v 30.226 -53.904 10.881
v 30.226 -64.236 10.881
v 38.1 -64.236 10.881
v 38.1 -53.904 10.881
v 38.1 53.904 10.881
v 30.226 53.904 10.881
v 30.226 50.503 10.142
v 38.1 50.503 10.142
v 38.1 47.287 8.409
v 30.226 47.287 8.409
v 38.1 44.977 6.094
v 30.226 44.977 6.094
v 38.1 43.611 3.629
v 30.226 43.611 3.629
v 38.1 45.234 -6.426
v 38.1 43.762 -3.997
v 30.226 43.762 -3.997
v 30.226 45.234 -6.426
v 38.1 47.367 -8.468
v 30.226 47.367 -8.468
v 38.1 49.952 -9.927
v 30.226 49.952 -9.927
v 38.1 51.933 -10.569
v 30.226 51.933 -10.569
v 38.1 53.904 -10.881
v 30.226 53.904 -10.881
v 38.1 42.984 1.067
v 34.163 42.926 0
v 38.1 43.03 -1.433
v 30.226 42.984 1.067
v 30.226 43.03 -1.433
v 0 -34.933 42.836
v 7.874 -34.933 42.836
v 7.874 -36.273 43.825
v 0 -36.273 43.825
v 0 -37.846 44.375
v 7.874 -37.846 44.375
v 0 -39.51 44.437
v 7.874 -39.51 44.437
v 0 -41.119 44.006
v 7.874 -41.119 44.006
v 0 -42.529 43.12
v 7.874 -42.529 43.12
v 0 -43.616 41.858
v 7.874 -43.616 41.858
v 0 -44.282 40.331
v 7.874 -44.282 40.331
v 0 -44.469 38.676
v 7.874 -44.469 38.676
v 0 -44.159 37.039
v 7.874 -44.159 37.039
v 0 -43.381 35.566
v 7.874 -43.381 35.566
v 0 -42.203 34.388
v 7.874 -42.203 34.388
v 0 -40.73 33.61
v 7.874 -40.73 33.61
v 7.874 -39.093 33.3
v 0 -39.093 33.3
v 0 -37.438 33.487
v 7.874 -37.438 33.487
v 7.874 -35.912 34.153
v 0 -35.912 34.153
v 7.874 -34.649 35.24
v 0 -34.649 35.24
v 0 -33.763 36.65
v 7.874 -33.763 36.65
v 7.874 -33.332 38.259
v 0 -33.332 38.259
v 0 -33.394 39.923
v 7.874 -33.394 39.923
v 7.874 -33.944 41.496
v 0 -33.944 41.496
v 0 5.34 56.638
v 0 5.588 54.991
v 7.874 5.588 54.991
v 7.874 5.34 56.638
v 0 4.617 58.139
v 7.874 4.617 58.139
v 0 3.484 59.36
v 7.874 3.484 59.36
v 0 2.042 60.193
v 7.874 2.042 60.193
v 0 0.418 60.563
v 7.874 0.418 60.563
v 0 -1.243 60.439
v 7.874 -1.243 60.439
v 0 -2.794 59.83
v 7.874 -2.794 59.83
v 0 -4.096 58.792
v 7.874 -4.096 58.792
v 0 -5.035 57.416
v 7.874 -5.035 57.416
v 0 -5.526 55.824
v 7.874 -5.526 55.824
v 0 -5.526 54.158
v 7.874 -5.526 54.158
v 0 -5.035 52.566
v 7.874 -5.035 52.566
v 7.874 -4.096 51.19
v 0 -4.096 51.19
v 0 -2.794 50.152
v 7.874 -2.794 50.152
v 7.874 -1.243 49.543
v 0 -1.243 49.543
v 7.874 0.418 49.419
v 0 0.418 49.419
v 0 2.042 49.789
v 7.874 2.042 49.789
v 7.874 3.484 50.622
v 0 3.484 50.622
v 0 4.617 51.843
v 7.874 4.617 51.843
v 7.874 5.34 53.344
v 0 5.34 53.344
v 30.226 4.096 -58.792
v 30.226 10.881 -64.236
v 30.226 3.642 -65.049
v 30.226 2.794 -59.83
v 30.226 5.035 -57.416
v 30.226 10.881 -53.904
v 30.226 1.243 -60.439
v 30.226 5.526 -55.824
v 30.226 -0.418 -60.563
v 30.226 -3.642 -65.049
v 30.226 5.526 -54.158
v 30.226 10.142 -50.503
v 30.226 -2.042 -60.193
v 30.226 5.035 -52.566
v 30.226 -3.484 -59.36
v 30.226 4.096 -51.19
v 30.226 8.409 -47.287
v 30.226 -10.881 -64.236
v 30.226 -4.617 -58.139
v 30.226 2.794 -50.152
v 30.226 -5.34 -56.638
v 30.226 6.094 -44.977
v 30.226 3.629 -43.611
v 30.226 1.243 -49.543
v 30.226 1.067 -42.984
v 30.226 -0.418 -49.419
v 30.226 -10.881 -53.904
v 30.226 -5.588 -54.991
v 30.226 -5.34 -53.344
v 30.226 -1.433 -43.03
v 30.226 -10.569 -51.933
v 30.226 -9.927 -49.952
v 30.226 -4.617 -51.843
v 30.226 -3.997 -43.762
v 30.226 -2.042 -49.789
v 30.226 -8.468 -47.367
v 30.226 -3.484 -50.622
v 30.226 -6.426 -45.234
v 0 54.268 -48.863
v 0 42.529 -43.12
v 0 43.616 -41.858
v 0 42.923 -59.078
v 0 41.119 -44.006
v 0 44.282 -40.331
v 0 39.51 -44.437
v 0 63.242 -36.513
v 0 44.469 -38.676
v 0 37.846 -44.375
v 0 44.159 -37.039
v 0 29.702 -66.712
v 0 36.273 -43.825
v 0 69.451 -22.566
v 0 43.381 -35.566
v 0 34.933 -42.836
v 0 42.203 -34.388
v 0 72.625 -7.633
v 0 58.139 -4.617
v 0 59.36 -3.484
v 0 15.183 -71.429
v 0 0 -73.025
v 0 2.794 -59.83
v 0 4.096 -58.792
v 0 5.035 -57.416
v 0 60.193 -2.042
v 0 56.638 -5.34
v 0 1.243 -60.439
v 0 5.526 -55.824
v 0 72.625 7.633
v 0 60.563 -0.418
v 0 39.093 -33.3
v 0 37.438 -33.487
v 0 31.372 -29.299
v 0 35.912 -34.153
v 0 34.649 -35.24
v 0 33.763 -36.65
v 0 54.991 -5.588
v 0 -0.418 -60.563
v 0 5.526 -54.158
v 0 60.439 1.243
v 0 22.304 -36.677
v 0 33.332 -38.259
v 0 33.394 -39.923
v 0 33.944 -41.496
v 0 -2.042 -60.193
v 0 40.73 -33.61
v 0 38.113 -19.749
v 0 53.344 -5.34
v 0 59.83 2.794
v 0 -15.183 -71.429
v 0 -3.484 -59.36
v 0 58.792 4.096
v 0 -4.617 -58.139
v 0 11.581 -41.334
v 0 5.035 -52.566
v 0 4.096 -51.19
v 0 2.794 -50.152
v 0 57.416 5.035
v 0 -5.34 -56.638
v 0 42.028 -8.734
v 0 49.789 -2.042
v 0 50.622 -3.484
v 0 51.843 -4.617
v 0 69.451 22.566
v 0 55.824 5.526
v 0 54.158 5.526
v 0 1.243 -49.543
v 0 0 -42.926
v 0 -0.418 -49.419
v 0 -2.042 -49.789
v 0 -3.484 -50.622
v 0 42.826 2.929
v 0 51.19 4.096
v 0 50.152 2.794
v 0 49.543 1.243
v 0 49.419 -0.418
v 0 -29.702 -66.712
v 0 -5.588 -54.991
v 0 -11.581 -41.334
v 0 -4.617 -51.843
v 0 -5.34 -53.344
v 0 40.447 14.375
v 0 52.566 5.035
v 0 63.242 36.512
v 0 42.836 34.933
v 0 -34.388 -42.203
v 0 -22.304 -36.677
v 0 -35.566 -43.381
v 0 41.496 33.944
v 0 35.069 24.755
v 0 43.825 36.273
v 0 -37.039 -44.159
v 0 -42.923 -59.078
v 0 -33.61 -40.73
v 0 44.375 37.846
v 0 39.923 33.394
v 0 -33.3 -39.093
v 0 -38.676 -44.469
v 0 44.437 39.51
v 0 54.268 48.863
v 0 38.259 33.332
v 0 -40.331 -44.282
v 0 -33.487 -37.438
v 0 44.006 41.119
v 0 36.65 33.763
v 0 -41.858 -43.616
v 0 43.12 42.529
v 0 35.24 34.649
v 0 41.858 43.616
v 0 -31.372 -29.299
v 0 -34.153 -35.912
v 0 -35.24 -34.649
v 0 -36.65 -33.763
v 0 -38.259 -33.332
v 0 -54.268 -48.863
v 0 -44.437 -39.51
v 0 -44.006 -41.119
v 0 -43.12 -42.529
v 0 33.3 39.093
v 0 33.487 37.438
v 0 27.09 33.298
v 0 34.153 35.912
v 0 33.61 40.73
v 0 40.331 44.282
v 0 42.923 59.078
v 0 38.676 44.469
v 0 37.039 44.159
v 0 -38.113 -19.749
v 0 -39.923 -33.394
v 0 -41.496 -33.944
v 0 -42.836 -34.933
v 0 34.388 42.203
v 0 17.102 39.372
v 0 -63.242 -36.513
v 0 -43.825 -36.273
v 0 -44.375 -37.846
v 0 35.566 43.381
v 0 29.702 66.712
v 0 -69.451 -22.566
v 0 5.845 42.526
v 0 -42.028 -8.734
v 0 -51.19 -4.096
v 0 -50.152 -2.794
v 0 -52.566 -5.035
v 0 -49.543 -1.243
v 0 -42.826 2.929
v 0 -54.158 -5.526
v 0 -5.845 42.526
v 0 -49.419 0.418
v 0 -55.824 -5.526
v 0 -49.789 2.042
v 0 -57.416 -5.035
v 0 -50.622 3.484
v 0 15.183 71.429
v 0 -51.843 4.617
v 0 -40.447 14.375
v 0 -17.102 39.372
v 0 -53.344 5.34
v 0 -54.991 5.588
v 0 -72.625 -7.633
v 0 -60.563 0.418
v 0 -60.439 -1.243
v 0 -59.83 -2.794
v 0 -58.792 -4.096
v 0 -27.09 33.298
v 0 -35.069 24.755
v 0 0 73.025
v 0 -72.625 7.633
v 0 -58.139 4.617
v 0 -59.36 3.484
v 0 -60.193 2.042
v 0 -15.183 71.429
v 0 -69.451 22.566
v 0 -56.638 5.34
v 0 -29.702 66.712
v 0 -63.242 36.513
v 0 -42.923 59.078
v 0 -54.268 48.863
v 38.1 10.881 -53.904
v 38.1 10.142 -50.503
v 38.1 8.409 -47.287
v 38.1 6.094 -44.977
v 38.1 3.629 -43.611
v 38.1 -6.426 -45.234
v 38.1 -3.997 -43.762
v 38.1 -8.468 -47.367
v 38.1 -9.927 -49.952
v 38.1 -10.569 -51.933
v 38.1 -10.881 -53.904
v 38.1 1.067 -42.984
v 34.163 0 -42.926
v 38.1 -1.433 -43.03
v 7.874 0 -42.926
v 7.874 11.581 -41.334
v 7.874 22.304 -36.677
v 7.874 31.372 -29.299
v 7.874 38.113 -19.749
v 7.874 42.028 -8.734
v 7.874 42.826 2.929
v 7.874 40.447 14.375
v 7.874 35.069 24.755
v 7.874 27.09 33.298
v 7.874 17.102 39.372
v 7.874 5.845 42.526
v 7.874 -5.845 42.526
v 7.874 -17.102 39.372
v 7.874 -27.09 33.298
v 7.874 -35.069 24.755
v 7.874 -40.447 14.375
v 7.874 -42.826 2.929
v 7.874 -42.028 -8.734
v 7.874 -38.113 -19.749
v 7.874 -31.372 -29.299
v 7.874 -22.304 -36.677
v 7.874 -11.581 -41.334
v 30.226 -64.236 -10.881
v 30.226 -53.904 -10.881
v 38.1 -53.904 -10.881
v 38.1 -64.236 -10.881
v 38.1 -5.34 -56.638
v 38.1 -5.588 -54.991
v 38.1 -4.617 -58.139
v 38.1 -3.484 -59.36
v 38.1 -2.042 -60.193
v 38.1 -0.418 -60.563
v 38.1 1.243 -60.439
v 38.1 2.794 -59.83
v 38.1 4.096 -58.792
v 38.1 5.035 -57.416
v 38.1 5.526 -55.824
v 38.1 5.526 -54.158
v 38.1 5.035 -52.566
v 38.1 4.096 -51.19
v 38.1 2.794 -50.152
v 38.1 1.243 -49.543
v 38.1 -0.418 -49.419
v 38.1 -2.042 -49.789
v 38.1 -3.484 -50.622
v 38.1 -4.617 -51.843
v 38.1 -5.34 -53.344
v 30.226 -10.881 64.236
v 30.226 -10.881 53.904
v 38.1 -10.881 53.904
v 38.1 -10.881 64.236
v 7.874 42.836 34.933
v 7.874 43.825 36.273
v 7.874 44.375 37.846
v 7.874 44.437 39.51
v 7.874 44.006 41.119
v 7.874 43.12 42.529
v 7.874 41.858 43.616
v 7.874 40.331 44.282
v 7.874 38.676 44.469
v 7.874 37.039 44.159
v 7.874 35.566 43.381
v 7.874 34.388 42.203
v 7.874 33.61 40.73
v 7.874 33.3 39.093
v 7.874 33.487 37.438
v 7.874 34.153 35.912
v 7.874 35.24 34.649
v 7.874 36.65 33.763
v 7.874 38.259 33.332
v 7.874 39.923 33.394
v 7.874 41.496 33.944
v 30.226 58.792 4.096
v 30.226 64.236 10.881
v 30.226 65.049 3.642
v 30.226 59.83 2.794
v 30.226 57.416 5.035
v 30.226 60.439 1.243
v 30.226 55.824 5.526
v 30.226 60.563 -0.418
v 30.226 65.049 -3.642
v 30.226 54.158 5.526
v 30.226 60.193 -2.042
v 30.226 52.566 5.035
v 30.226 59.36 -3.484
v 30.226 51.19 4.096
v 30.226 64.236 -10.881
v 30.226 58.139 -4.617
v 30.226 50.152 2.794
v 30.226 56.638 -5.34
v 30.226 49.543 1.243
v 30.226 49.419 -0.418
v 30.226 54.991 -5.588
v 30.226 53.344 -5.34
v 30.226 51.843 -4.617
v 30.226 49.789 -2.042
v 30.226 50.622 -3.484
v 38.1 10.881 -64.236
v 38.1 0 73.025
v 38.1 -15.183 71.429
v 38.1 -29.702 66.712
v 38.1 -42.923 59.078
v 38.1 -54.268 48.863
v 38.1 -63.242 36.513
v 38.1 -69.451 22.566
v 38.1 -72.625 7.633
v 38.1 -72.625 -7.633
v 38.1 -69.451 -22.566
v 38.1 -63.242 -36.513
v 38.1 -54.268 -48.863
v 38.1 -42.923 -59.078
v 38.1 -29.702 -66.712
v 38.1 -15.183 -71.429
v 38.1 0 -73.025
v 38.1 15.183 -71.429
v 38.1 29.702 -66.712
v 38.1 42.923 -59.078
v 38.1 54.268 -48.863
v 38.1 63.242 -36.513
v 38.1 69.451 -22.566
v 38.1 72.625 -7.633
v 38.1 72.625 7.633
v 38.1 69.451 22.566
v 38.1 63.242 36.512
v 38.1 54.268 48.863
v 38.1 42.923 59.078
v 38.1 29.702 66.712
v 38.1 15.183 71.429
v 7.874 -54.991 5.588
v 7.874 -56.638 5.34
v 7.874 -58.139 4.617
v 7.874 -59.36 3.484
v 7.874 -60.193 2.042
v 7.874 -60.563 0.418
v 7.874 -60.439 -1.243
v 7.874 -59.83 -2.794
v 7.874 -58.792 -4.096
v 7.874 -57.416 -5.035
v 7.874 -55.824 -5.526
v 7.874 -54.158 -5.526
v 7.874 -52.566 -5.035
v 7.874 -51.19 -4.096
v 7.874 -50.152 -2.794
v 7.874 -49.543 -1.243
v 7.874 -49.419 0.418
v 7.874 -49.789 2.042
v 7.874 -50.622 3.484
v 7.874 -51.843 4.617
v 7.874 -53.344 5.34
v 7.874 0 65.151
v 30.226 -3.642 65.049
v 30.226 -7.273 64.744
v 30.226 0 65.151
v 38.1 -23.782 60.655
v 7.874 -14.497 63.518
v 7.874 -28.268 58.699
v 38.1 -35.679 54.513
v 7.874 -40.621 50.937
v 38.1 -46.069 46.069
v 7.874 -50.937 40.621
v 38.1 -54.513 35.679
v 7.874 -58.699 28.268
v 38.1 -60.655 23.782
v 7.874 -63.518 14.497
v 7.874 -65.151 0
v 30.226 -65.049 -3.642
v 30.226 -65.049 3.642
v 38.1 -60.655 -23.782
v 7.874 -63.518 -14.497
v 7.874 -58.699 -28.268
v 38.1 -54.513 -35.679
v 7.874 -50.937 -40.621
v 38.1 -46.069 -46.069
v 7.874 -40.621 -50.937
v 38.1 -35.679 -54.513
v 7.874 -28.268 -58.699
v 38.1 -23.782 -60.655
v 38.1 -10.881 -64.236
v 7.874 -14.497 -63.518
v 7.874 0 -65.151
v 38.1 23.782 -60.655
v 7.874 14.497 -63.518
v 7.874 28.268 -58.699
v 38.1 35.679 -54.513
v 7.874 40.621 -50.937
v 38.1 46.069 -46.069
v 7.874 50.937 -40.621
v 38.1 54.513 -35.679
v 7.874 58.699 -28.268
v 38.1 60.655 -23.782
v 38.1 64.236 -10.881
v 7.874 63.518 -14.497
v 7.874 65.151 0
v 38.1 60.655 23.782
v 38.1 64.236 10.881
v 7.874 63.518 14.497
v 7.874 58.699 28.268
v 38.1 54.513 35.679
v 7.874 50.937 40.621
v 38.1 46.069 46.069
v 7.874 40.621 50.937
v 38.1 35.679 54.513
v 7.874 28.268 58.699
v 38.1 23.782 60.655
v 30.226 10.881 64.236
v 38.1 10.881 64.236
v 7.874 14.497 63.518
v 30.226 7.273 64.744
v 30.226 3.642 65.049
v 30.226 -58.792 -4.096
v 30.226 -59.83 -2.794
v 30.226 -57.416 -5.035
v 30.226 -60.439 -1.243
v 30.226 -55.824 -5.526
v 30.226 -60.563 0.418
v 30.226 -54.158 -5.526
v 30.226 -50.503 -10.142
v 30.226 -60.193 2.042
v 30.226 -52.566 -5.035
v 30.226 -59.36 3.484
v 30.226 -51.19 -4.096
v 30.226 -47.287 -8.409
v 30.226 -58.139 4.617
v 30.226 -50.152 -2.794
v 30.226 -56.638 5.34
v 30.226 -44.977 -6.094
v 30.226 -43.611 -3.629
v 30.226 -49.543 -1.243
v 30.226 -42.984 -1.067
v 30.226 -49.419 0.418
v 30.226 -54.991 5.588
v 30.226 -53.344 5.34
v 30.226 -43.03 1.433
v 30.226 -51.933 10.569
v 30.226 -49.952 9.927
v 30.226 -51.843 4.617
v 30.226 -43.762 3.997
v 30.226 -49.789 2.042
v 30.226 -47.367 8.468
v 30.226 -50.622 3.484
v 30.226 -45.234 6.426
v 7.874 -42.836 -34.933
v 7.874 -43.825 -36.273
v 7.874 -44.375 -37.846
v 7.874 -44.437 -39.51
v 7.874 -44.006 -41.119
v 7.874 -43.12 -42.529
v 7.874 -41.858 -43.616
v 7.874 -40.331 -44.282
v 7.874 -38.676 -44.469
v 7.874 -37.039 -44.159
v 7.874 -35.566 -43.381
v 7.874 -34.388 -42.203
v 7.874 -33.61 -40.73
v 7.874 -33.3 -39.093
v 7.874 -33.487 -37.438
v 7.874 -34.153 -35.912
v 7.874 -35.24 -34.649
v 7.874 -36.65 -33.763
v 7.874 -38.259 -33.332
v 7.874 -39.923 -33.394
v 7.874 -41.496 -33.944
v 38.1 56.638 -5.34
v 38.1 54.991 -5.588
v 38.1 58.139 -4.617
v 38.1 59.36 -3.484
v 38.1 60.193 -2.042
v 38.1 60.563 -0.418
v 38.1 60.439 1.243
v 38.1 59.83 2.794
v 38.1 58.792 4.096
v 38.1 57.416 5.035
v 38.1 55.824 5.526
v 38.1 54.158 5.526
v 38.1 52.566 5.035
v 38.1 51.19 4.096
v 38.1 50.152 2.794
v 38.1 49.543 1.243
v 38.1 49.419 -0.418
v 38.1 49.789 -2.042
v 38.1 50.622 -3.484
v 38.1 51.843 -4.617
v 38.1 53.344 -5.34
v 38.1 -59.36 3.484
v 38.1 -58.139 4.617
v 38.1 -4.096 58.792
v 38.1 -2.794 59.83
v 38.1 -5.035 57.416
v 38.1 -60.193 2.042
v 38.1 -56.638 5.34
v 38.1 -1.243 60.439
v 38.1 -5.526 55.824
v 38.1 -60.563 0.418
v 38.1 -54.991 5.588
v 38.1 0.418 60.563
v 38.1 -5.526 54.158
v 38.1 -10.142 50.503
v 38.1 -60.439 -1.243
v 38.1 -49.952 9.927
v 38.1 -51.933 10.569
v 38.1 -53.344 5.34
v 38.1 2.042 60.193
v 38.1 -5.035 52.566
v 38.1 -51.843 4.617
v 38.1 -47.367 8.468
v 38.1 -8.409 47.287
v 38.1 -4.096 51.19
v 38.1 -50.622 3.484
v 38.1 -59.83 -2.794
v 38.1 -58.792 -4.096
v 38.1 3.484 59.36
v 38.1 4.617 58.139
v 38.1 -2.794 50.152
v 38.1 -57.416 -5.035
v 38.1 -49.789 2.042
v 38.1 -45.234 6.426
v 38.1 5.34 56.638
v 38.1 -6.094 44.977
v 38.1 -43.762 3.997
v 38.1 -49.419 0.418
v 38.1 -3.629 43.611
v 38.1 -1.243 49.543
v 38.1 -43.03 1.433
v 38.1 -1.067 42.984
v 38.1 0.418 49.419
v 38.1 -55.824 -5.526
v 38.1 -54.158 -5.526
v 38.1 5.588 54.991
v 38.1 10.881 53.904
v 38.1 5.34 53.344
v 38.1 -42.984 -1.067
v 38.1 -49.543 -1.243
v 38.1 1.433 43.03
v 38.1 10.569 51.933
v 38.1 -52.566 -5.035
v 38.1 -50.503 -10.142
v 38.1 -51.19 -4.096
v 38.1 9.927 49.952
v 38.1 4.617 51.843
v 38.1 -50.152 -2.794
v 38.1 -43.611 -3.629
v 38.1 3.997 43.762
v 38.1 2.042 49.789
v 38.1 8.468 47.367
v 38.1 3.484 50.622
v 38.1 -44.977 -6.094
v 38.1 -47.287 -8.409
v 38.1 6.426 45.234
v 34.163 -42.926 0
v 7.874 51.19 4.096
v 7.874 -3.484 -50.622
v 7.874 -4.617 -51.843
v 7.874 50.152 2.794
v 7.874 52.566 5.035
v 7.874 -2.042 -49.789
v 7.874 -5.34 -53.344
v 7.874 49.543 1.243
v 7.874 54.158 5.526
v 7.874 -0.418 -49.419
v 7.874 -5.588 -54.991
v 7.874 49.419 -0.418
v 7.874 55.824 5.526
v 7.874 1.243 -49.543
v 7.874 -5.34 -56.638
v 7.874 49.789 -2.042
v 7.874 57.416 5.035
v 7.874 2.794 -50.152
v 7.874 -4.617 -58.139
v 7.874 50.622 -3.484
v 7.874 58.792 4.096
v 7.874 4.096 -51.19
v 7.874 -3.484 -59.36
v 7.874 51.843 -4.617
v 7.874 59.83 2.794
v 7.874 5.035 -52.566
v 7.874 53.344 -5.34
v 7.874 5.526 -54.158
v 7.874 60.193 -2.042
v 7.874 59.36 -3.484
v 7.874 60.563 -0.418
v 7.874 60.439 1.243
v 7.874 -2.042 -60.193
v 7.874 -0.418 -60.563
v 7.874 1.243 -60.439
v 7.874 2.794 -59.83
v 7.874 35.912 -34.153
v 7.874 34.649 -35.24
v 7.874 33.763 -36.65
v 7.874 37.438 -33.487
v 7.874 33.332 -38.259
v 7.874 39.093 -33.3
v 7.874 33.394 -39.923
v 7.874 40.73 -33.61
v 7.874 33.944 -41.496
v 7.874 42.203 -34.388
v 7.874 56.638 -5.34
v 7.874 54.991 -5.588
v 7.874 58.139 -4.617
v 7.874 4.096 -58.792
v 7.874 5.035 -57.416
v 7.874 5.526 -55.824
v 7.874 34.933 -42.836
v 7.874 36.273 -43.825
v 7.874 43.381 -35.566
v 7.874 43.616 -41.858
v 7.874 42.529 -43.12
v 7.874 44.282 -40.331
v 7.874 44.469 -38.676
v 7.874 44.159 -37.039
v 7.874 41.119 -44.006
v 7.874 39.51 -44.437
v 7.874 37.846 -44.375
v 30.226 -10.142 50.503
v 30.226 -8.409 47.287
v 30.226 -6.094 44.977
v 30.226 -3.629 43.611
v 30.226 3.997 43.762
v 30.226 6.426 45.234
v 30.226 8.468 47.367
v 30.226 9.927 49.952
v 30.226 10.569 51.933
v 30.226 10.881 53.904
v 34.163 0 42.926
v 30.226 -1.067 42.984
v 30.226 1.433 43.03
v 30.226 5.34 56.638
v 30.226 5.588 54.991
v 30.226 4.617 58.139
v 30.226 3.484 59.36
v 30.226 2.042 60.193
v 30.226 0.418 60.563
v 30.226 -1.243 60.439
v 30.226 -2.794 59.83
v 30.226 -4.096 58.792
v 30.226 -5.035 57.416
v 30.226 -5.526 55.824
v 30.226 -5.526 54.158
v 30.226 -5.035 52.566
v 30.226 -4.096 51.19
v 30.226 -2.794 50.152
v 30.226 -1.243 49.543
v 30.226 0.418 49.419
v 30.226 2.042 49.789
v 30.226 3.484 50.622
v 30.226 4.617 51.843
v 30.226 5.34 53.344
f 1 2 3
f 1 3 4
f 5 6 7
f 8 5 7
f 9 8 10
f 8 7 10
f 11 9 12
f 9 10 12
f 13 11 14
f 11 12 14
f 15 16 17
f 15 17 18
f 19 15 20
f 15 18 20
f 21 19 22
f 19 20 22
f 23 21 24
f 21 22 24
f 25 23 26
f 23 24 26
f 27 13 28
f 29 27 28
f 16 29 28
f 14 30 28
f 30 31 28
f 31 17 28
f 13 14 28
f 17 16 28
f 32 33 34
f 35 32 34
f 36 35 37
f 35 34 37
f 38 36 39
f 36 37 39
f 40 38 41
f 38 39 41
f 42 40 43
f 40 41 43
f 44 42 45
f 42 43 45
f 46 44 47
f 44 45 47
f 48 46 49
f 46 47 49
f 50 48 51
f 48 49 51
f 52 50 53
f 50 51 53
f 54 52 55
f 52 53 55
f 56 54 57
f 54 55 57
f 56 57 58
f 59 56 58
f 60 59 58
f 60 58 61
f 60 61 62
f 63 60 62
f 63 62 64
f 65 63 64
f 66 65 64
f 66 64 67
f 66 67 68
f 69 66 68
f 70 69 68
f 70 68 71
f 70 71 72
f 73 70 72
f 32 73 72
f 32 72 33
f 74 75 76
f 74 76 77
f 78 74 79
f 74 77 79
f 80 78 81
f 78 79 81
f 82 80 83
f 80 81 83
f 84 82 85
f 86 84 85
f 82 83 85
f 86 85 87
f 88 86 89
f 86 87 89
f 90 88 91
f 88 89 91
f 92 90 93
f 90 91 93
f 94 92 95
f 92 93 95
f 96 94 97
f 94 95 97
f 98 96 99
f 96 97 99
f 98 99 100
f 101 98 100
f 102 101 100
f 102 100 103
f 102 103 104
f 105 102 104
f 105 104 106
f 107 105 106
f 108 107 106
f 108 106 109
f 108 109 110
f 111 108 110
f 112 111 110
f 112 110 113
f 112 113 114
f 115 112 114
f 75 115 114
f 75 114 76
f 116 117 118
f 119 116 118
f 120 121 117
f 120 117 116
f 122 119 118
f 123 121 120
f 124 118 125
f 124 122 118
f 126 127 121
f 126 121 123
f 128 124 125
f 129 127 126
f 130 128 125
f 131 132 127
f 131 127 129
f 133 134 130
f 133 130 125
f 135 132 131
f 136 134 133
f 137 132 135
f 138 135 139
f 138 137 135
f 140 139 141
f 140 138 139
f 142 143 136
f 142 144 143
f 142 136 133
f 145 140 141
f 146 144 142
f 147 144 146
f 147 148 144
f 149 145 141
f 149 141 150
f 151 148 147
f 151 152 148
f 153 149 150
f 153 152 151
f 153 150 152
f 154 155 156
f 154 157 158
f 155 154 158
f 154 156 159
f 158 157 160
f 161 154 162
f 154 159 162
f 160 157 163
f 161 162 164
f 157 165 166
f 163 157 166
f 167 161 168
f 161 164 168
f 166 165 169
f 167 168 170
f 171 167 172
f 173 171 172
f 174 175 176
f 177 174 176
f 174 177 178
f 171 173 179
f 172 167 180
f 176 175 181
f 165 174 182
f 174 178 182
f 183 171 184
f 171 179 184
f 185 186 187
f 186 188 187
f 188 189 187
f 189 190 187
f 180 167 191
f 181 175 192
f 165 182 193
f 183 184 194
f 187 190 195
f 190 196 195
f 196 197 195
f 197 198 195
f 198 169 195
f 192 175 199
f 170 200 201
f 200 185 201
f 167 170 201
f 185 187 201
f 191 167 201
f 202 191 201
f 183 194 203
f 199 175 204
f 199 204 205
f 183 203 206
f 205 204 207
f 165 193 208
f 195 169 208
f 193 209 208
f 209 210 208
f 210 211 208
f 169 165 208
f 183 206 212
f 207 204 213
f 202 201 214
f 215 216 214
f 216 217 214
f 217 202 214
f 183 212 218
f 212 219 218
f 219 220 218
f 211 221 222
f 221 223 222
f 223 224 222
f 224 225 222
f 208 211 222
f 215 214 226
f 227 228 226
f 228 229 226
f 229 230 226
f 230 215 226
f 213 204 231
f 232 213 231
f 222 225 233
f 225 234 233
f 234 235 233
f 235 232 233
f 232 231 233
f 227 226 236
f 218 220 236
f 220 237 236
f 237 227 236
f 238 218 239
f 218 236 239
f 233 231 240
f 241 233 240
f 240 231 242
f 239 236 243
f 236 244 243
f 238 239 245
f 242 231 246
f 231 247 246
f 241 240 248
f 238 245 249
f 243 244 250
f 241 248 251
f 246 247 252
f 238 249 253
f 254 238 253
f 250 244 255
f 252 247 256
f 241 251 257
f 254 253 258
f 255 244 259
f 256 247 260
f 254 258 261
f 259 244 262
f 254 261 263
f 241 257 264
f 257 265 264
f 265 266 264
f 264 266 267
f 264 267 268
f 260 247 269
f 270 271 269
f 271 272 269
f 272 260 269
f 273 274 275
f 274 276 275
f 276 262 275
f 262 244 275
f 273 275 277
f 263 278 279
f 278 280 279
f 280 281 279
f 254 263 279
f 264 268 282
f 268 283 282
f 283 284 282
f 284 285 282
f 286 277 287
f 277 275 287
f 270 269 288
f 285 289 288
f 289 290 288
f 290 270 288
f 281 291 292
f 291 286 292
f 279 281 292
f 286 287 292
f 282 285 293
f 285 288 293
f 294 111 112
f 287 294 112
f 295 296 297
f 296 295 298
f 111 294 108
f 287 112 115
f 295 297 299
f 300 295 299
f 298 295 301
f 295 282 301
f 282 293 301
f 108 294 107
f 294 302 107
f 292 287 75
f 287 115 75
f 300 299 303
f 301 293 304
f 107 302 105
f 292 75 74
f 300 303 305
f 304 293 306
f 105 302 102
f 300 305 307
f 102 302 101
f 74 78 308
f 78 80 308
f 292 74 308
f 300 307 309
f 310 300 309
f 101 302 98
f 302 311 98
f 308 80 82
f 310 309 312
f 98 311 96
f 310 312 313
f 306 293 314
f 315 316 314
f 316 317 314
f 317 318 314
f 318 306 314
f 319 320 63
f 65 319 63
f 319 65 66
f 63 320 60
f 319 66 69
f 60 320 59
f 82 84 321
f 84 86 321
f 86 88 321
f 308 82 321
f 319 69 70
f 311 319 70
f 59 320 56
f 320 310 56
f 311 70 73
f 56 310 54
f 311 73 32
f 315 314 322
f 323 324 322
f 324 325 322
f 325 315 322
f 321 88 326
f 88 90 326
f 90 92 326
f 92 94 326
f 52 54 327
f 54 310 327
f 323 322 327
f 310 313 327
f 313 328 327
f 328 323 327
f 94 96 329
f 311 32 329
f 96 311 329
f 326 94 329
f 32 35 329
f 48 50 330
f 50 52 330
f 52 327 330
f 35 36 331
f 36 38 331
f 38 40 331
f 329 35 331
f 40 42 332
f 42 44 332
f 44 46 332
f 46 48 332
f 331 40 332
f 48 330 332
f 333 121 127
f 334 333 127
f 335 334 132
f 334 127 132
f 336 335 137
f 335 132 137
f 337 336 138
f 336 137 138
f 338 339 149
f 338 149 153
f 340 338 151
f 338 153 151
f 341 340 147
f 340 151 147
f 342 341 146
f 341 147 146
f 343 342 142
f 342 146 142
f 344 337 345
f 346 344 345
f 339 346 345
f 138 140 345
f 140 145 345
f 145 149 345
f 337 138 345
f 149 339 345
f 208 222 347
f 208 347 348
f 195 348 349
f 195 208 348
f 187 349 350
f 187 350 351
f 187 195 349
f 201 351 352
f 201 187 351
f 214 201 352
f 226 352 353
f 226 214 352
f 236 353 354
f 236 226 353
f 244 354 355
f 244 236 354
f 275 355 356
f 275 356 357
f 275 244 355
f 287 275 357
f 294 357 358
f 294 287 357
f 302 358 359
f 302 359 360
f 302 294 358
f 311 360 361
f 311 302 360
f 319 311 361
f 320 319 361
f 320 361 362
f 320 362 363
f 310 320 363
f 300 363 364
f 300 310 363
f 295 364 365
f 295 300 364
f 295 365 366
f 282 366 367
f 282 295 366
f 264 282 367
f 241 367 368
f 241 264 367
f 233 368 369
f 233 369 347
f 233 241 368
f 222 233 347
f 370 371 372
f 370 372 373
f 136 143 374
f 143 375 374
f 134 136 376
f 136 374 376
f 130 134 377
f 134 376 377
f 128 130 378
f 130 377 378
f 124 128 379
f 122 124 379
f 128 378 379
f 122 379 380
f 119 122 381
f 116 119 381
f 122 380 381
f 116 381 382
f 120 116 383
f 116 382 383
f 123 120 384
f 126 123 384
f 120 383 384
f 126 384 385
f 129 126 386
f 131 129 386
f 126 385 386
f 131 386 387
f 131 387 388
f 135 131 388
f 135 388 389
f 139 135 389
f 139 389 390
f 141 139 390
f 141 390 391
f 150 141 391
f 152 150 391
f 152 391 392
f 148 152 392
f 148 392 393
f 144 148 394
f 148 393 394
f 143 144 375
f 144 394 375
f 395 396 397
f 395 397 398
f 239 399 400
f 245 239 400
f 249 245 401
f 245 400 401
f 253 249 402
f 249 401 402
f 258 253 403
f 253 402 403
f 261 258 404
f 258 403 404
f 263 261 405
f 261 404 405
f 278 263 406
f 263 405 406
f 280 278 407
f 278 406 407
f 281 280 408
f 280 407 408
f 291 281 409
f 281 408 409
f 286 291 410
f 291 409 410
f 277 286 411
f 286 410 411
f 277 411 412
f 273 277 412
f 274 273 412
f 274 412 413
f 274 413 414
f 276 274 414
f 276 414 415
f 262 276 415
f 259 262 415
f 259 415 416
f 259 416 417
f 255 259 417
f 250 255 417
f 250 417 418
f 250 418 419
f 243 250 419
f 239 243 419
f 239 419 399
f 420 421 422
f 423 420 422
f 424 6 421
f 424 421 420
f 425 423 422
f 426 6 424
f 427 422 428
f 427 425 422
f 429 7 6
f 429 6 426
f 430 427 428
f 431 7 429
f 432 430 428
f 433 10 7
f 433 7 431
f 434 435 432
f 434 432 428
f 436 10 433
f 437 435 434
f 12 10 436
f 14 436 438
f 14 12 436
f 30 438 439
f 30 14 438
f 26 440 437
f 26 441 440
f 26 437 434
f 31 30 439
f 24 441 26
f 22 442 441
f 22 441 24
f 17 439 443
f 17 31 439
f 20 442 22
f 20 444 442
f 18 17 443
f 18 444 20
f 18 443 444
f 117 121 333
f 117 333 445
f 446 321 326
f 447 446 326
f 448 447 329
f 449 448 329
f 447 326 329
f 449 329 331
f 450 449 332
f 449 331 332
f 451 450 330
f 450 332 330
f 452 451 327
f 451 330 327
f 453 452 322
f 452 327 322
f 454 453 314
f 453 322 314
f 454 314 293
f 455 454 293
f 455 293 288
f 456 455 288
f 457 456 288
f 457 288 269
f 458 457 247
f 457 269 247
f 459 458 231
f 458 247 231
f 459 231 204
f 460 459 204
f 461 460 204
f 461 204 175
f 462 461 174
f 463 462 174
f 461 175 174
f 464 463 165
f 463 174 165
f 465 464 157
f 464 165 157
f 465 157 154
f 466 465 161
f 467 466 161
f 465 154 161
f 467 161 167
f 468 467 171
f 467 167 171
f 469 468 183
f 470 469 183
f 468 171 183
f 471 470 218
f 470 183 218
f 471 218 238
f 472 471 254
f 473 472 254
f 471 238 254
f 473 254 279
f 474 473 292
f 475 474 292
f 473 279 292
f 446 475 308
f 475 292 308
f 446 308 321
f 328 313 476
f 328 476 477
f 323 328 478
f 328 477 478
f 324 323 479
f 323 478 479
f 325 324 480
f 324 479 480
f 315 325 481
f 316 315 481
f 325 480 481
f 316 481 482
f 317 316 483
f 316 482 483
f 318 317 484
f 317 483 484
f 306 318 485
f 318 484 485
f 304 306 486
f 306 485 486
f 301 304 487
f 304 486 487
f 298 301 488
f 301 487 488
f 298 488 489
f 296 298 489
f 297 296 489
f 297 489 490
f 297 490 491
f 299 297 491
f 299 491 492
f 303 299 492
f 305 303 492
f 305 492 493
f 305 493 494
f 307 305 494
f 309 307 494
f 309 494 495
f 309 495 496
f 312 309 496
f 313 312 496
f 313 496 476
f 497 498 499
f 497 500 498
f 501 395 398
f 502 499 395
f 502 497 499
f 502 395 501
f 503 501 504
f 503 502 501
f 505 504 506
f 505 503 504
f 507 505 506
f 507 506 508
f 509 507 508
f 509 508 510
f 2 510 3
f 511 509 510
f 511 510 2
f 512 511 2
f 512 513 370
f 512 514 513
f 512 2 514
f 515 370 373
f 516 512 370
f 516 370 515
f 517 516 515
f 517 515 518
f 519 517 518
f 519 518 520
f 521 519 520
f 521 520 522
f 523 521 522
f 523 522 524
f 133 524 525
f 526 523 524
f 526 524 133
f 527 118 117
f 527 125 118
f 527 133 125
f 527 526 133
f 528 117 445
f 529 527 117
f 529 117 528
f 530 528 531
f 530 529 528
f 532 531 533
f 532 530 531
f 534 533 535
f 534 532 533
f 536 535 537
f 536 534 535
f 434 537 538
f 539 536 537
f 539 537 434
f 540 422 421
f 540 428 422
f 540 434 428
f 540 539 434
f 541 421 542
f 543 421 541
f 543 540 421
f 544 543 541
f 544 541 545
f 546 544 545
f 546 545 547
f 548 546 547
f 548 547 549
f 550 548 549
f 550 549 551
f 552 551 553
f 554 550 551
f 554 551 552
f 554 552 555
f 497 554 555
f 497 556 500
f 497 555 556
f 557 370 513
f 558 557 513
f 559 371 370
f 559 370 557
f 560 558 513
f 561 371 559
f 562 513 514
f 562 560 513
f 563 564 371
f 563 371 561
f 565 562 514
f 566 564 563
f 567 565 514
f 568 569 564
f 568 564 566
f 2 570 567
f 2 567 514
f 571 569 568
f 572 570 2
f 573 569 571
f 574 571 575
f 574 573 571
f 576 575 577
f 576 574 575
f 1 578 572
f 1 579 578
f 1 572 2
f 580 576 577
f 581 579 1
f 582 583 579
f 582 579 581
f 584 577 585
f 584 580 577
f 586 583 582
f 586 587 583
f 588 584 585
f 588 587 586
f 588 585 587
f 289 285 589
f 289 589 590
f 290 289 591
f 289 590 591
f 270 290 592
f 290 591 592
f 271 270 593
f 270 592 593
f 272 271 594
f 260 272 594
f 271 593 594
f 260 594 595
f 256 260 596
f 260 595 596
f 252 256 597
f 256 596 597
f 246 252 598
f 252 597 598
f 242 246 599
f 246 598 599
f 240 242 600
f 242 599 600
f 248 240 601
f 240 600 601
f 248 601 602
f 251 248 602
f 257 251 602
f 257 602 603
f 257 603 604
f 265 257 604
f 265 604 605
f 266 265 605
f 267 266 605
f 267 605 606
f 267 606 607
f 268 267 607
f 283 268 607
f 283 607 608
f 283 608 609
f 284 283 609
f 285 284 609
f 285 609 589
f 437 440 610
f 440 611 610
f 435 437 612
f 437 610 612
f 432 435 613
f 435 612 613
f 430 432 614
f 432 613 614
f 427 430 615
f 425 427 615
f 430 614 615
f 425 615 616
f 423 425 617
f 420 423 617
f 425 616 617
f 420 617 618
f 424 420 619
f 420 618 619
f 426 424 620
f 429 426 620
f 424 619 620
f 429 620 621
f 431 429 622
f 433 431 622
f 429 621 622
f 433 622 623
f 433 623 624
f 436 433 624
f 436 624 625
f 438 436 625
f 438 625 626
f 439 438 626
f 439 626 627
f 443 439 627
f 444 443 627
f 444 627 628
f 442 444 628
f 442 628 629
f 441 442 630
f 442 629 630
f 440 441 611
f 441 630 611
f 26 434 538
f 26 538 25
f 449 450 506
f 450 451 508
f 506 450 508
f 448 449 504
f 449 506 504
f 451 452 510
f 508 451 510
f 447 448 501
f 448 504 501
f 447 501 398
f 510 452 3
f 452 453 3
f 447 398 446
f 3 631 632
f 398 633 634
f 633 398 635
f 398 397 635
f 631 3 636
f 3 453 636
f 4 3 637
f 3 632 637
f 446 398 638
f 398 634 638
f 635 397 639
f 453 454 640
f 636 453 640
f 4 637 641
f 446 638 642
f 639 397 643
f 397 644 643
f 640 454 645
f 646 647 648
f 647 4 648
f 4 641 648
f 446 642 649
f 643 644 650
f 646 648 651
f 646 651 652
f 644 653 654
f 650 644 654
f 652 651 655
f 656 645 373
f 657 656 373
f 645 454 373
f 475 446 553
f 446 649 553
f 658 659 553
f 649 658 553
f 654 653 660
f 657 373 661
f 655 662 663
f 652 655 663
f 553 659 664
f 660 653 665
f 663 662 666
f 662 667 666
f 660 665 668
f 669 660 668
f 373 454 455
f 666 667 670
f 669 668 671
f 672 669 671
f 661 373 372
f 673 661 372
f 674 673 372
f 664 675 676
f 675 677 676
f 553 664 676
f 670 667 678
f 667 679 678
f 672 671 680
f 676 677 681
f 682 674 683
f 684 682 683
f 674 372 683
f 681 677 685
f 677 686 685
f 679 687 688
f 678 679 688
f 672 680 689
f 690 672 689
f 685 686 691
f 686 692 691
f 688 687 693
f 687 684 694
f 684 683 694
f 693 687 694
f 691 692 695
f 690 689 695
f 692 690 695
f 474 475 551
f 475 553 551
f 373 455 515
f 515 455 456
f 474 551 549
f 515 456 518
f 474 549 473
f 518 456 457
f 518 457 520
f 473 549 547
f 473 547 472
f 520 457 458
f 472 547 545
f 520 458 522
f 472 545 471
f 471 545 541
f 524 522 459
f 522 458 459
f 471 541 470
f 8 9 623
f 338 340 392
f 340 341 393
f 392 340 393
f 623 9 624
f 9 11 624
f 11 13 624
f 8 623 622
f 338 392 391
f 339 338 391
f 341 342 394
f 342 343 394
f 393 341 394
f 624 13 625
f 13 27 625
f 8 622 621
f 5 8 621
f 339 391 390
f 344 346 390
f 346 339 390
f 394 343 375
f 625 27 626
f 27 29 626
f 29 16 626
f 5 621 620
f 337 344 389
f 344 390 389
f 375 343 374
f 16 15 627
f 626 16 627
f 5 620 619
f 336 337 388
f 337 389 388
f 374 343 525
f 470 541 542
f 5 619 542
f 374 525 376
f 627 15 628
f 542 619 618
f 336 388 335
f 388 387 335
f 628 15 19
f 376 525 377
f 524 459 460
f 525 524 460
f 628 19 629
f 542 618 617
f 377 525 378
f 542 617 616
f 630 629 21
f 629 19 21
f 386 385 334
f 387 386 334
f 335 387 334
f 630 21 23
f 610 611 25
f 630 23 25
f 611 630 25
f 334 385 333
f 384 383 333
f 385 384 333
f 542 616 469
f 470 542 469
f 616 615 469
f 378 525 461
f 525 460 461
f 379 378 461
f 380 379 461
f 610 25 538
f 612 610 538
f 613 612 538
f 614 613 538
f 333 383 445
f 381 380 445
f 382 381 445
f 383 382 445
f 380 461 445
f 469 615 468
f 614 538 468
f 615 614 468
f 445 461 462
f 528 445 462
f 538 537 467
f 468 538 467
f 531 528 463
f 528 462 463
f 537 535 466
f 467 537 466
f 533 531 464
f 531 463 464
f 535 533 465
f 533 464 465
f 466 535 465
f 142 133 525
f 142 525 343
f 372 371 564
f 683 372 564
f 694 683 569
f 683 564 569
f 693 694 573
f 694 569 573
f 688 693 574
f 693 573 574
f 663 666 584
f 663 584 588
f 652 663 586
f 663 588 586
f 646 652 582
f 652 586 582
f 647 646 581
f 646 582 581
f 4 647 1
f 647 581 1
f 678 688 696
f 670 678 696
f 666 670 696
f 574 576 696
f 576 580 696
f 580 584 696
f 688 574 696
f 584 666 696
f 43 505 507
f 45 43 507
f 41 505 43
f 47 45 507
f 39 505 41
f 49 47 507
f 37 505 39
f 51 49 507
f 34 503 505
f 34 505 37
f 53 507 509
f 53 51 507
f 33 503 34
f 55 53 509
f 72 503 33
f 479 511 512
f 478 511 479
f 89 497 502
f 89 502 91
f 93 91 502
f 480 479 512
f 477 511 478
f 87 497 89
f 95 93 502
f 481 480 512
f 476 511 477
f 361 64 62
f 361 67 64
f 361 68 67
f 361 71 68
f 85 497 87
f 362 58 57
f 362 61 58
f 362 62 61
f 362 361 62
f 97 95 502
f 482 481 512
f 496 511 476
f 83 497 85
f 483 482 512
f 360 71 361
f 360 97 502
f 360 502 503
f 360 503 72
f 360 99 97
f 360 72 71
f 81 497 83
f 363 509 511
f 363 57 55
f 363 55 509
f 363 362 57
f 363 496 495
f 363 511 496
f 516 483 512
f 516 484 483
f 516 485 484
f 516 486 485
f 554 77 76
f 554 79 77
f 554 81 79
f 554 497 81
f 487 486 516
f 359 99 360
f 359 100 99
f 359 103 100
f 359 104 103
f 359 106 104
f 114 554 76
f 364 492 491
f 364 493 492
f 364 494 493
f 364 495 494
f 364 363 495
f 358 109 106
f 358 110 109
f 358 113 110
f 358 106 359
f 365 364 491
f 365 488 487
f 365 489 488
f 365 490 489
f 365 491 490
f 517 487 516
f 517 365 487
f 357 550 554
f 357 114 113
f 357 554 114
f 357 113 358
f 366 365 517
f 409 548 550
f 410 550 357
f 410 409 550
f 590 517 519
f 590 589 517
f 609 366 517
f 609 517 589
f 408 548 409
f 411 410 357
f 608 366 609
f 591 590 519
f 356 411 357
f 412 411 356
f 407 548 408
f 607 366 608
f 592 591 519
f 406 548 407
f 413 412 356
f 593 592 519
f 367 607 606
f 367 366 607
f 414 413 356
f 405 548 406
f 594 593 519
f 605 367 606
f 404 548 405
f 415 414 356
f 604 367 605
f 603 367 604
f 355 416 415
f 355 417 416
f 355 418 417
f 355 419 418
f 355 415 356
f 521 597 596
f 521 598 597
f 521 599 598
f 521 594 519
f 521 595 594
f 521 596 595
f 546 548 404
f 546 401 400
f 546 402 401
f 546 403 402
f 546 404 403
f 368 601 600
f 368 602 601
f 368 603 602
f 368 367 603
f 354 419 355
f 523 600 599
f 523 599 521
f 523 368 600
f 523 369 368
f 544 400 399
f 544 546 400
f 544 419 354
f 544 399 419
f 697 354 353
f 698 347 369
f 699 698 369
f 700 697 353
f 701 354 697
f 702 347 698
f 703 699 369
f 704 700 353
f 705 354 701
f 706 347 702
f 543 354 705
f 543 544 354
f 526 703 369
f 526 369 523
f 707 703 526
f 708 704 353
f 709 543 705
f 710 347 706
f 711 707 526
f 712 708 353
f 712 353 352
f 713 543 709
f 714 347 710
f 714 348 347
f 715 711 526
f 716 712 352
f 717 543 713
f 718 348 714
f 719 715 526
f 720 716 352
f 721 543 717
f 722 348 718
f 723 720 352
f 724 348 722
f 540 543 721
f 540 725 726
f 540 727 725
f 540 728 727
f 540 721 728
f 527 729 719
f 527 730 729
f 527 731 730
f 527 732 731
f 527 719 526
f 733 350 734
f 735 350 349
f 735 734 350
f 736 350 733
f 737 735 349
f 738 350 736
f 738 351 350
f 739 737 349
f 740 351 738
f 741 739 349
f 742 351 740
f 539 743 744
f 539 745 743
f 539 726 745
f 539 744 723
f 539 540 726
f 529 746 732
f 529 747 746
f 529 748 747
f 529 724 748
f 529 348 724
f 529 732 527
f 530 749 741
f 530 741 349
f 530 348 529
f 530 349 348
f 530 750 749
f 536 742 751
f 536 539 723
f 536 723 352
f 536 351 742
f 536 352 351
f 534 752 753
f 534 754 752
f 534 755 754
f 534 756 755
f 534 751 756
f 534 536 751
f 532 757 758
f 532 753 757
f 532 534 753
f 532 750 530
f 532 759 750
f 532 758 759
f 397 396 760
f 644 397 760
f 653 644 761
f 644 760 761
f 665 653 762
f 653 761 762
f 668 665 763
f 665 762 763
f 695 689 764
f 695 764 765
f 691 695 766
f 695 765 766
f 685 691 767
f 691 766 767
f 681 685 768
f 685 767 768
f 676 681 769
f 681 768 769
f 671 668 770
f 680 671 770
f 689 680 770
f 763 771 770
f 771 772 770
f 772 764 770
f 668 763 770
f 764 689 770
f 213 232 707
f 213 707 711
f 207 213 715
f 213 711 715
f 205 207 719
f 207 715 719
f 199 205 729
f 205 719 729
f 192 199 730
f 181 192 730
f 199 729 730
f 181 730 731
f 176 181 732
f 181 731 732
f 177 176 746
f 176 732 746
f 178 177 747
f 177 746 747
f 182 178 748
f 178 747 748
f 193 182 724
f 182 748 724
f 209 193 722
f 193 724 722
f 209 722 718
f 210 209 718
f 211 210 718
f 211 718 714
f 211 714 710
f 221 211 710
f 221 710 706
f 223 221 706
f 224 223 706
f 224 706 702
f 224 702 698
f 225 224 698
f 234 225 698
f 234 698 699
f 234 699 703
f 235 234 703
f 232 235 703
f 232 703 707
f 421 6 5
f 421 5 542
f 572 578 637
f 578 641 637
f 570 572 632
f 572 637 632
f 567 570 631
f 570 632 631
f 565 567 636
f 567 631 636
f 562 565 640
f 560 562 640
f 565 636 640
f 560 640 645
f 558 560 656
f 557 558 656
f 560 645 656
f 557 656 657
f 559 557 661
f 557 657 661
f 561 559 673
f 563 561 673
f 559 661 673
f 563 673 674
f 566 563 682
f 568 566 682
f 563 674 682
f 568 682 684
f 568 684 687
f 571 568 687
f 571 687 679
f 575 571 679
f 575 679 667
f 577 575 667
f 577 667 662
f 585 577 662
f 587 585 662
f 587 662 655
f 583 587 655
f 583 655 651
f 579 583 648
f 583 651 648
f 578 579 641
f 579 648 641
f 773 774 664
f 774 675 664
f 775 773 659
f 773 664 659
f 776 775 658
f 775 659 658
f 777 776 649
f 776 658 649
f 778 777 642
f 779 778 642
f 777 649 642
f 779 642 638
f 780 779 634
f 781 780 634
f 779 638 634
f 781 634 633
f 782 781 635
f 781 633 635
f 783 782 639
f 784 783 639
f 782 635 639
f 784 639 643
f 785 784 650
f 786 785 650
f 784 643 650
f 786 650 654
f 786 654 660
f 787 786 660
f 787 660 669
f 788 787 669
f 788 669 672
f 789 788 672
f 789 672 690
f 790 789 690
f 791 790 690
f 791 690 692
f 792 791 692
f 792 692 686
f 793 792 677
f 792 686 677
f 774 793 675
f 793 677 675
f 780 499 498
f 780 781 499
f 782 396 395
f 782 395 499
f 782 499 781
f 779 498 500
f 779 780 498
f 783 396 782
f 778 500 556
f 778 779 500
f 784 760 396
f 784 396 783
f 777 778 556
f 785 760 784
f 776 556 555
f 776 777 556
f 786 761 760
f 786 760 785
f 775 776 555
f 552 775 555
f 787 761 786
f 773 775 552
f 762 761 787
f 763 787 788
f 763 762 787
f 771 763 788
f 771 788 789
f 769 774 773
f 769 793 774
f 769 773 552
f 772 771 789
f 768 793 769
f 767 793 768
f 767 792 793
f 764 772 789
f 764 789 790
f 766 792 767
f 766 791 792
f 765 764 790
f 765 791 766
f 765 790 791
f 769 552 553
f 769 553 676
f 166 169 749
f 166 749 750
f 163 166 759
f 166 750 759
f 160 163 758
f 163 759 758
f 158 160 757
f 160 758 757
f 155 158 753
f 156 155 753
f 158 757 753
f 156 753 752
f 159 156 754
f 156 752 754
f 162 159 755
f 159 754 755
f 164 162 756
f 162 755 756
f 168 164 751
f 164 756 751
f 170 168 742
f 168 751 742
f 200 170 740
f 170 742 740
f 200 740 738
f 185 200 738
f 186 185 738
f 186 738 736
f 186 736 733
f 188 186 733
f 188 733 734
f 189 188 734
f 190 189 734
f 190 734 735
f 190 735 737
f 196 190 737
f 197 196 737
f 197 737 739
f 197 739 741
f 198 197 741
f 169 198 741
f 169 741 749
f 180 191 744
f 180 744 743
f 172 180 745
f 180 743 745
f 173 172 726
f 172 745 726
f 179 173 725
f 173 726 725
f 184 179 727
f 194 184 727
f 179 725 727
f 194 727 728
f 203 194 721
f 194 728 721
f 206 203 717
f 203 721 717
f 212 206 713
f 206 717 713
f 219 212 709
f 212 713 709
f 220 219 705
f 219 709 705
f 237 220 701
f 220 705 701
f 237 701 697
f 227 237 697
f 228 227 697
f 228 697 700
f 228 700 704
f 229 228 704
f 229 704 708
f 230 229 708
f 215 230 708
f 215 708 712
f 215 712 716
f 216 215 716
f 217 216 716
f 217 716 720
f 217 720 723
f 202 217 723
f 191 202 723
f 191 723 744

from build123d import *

# Parameters (mm, degrees)
SKETCH1_R           = 65.151
SKETCH1_R_2         = 42.926
BOSS_EXTRUDE2_DEPTH = 7.874
SKETCH1_5_R         = 73.025
SKETCH1_5_R_2       = 65.151
BOSS_EXTRUDE3_DEPTH = 38.1
SKETCH24_R          = 5.588
CUT_EXTRUDE1_DEPTH  = 38.1
CIRPATTERN3_COUNT   = 8
BOSS_EXTRUDE7_START = -7.874
BOSS_EXTRUDE7_DEPTH = 7.874
SKETCH35_R          = 5.588
CUT_EXTRUDE2_DEPTH  = 111.076842611
CIRPATTERN9_COUNT   = 4


with BuildPart() as part:
    # Sketch1 → Boss-Extrude2 (new body)
    with BuildSketch(Plane(origin=(0, 0, 0), x_dir=(0, 0, -1), z_dir=(1, 0, 0))):
        Circle(SKETCH1_R)
        Circle(SKETCH1_R_2, mode=Mode.SUBTRACT)
    extrude(amount=BOSS_EXTRUDE2_DEPTH)

    # Sketch1<5> → Boss-Extrude3 (add)
    with BuildSketch(Plane(origin=(0, 0, 0), x_dir=(0, 0, -1), z_dir=(1, 0, 0))):
        Circle(SKETCH1_5_R)
        Circle(SKETCH1_5_R_2, mode=Mode.SUBTRACT)
    extrude(amount=BOSS_EXTRUDE3_DEPTH)

    # Sketch24 → Cut-Extrude1 (cut)
    with BuildSketch(Plane(origin=(7.874, 0, 0), x_dir=(0, 0, -1), z_dir=(1, 0, 0))):
        with Locations((0, 54.991)):
            Circle(SKETCH24_R)
    cut_extrude1 = extrude(amount=-CUT_EXTRUDE1_DEPTH, mode=Mode.SUBTRACT)

    # CirPattern3: Cut-Extrude1 ×8 about axis
    cirpattern3_axis = Axis((7.874, 0, 0), (1, 0, 0))
    for i in range(1, CIRPATTERN3_COUNT):
        add(cut_extrude1.rotate(cirpattern3_axis, i * 360 / CIRPATTERN3_COUNT), mode=Mode.SUBTRACT)

    # Sketch34 → Boss-Extrude7 (add)
    with BuildSketch(Plane(origin=(38.1, 0, 0), x_dir=(0, 0, -1), z_dir=(1, 0, 0)).offset(BOSS_EXTRUDE7_START)):
        with BuildLine():
            Line((10.881292196, -53.903687825), (10.881292196, -64.235895581))
            ThreePointArc((10.881292196, -64.235895581), (0, -65.151), (-10.881292196, -64.235895581))
            Line((-10.881292196, -64.235895581), (-10.881292196, -53.903687825))
            add(Edge.make_bspline(
                [(10.881292196, -53.903687825), (9.981727061, -42.926), (0, -42.926), (-9.981727061, -42.926), (-10.881292196, -53.903687825)],
                knots=[1.661039958, 1.661039958, 1.661039958, 3.141592654, 3.141592654, 4.622145349, 4.622145349, 4.622145349], degree=2, weights=[1, 0.738282192, 1, 0.738282192, 1]))
        make_face()
    boss_extrude7 = extrude(amount=BOSS_EXTRUDE7_DEPTH)

    # Sketch35 → Cut-Extrude2 (cut, through all)
    with BuildSketch(Plane(origin=(38.1, 0, 0), x_dir=(0, 0, -1), z_dir=(1, 0, 0))):
        with Locations((0, -54.991)):
            Circle(SKETCH35_R)
    cut_extrude2 = extrude(amount=-CUT_EXTRUDE2_DEPTH, mode=Mode.SUBTRACT)

    # CirPattern9: Boss-Extrude7, Cut-Extrude2 ×4 about axis
    cirpattern9_axis = Axis((38.1, 0, 0), (-1, 0, 0))
    add([boss_extrude7.rotate(cirpattern9_axis, i * 360 / CIRPATTERN9_COUNT) for i in range(1, CIRPATTERN9_COUNT)])
    add([cut_extrude2.rotate(cirpattern9_axis, i * 360 / CIRPATTERN9_COUNT) for i in range(1, CIRPATTERN9_COUNT)], mode=Mode.SUBTRACT)


solid = part.part
